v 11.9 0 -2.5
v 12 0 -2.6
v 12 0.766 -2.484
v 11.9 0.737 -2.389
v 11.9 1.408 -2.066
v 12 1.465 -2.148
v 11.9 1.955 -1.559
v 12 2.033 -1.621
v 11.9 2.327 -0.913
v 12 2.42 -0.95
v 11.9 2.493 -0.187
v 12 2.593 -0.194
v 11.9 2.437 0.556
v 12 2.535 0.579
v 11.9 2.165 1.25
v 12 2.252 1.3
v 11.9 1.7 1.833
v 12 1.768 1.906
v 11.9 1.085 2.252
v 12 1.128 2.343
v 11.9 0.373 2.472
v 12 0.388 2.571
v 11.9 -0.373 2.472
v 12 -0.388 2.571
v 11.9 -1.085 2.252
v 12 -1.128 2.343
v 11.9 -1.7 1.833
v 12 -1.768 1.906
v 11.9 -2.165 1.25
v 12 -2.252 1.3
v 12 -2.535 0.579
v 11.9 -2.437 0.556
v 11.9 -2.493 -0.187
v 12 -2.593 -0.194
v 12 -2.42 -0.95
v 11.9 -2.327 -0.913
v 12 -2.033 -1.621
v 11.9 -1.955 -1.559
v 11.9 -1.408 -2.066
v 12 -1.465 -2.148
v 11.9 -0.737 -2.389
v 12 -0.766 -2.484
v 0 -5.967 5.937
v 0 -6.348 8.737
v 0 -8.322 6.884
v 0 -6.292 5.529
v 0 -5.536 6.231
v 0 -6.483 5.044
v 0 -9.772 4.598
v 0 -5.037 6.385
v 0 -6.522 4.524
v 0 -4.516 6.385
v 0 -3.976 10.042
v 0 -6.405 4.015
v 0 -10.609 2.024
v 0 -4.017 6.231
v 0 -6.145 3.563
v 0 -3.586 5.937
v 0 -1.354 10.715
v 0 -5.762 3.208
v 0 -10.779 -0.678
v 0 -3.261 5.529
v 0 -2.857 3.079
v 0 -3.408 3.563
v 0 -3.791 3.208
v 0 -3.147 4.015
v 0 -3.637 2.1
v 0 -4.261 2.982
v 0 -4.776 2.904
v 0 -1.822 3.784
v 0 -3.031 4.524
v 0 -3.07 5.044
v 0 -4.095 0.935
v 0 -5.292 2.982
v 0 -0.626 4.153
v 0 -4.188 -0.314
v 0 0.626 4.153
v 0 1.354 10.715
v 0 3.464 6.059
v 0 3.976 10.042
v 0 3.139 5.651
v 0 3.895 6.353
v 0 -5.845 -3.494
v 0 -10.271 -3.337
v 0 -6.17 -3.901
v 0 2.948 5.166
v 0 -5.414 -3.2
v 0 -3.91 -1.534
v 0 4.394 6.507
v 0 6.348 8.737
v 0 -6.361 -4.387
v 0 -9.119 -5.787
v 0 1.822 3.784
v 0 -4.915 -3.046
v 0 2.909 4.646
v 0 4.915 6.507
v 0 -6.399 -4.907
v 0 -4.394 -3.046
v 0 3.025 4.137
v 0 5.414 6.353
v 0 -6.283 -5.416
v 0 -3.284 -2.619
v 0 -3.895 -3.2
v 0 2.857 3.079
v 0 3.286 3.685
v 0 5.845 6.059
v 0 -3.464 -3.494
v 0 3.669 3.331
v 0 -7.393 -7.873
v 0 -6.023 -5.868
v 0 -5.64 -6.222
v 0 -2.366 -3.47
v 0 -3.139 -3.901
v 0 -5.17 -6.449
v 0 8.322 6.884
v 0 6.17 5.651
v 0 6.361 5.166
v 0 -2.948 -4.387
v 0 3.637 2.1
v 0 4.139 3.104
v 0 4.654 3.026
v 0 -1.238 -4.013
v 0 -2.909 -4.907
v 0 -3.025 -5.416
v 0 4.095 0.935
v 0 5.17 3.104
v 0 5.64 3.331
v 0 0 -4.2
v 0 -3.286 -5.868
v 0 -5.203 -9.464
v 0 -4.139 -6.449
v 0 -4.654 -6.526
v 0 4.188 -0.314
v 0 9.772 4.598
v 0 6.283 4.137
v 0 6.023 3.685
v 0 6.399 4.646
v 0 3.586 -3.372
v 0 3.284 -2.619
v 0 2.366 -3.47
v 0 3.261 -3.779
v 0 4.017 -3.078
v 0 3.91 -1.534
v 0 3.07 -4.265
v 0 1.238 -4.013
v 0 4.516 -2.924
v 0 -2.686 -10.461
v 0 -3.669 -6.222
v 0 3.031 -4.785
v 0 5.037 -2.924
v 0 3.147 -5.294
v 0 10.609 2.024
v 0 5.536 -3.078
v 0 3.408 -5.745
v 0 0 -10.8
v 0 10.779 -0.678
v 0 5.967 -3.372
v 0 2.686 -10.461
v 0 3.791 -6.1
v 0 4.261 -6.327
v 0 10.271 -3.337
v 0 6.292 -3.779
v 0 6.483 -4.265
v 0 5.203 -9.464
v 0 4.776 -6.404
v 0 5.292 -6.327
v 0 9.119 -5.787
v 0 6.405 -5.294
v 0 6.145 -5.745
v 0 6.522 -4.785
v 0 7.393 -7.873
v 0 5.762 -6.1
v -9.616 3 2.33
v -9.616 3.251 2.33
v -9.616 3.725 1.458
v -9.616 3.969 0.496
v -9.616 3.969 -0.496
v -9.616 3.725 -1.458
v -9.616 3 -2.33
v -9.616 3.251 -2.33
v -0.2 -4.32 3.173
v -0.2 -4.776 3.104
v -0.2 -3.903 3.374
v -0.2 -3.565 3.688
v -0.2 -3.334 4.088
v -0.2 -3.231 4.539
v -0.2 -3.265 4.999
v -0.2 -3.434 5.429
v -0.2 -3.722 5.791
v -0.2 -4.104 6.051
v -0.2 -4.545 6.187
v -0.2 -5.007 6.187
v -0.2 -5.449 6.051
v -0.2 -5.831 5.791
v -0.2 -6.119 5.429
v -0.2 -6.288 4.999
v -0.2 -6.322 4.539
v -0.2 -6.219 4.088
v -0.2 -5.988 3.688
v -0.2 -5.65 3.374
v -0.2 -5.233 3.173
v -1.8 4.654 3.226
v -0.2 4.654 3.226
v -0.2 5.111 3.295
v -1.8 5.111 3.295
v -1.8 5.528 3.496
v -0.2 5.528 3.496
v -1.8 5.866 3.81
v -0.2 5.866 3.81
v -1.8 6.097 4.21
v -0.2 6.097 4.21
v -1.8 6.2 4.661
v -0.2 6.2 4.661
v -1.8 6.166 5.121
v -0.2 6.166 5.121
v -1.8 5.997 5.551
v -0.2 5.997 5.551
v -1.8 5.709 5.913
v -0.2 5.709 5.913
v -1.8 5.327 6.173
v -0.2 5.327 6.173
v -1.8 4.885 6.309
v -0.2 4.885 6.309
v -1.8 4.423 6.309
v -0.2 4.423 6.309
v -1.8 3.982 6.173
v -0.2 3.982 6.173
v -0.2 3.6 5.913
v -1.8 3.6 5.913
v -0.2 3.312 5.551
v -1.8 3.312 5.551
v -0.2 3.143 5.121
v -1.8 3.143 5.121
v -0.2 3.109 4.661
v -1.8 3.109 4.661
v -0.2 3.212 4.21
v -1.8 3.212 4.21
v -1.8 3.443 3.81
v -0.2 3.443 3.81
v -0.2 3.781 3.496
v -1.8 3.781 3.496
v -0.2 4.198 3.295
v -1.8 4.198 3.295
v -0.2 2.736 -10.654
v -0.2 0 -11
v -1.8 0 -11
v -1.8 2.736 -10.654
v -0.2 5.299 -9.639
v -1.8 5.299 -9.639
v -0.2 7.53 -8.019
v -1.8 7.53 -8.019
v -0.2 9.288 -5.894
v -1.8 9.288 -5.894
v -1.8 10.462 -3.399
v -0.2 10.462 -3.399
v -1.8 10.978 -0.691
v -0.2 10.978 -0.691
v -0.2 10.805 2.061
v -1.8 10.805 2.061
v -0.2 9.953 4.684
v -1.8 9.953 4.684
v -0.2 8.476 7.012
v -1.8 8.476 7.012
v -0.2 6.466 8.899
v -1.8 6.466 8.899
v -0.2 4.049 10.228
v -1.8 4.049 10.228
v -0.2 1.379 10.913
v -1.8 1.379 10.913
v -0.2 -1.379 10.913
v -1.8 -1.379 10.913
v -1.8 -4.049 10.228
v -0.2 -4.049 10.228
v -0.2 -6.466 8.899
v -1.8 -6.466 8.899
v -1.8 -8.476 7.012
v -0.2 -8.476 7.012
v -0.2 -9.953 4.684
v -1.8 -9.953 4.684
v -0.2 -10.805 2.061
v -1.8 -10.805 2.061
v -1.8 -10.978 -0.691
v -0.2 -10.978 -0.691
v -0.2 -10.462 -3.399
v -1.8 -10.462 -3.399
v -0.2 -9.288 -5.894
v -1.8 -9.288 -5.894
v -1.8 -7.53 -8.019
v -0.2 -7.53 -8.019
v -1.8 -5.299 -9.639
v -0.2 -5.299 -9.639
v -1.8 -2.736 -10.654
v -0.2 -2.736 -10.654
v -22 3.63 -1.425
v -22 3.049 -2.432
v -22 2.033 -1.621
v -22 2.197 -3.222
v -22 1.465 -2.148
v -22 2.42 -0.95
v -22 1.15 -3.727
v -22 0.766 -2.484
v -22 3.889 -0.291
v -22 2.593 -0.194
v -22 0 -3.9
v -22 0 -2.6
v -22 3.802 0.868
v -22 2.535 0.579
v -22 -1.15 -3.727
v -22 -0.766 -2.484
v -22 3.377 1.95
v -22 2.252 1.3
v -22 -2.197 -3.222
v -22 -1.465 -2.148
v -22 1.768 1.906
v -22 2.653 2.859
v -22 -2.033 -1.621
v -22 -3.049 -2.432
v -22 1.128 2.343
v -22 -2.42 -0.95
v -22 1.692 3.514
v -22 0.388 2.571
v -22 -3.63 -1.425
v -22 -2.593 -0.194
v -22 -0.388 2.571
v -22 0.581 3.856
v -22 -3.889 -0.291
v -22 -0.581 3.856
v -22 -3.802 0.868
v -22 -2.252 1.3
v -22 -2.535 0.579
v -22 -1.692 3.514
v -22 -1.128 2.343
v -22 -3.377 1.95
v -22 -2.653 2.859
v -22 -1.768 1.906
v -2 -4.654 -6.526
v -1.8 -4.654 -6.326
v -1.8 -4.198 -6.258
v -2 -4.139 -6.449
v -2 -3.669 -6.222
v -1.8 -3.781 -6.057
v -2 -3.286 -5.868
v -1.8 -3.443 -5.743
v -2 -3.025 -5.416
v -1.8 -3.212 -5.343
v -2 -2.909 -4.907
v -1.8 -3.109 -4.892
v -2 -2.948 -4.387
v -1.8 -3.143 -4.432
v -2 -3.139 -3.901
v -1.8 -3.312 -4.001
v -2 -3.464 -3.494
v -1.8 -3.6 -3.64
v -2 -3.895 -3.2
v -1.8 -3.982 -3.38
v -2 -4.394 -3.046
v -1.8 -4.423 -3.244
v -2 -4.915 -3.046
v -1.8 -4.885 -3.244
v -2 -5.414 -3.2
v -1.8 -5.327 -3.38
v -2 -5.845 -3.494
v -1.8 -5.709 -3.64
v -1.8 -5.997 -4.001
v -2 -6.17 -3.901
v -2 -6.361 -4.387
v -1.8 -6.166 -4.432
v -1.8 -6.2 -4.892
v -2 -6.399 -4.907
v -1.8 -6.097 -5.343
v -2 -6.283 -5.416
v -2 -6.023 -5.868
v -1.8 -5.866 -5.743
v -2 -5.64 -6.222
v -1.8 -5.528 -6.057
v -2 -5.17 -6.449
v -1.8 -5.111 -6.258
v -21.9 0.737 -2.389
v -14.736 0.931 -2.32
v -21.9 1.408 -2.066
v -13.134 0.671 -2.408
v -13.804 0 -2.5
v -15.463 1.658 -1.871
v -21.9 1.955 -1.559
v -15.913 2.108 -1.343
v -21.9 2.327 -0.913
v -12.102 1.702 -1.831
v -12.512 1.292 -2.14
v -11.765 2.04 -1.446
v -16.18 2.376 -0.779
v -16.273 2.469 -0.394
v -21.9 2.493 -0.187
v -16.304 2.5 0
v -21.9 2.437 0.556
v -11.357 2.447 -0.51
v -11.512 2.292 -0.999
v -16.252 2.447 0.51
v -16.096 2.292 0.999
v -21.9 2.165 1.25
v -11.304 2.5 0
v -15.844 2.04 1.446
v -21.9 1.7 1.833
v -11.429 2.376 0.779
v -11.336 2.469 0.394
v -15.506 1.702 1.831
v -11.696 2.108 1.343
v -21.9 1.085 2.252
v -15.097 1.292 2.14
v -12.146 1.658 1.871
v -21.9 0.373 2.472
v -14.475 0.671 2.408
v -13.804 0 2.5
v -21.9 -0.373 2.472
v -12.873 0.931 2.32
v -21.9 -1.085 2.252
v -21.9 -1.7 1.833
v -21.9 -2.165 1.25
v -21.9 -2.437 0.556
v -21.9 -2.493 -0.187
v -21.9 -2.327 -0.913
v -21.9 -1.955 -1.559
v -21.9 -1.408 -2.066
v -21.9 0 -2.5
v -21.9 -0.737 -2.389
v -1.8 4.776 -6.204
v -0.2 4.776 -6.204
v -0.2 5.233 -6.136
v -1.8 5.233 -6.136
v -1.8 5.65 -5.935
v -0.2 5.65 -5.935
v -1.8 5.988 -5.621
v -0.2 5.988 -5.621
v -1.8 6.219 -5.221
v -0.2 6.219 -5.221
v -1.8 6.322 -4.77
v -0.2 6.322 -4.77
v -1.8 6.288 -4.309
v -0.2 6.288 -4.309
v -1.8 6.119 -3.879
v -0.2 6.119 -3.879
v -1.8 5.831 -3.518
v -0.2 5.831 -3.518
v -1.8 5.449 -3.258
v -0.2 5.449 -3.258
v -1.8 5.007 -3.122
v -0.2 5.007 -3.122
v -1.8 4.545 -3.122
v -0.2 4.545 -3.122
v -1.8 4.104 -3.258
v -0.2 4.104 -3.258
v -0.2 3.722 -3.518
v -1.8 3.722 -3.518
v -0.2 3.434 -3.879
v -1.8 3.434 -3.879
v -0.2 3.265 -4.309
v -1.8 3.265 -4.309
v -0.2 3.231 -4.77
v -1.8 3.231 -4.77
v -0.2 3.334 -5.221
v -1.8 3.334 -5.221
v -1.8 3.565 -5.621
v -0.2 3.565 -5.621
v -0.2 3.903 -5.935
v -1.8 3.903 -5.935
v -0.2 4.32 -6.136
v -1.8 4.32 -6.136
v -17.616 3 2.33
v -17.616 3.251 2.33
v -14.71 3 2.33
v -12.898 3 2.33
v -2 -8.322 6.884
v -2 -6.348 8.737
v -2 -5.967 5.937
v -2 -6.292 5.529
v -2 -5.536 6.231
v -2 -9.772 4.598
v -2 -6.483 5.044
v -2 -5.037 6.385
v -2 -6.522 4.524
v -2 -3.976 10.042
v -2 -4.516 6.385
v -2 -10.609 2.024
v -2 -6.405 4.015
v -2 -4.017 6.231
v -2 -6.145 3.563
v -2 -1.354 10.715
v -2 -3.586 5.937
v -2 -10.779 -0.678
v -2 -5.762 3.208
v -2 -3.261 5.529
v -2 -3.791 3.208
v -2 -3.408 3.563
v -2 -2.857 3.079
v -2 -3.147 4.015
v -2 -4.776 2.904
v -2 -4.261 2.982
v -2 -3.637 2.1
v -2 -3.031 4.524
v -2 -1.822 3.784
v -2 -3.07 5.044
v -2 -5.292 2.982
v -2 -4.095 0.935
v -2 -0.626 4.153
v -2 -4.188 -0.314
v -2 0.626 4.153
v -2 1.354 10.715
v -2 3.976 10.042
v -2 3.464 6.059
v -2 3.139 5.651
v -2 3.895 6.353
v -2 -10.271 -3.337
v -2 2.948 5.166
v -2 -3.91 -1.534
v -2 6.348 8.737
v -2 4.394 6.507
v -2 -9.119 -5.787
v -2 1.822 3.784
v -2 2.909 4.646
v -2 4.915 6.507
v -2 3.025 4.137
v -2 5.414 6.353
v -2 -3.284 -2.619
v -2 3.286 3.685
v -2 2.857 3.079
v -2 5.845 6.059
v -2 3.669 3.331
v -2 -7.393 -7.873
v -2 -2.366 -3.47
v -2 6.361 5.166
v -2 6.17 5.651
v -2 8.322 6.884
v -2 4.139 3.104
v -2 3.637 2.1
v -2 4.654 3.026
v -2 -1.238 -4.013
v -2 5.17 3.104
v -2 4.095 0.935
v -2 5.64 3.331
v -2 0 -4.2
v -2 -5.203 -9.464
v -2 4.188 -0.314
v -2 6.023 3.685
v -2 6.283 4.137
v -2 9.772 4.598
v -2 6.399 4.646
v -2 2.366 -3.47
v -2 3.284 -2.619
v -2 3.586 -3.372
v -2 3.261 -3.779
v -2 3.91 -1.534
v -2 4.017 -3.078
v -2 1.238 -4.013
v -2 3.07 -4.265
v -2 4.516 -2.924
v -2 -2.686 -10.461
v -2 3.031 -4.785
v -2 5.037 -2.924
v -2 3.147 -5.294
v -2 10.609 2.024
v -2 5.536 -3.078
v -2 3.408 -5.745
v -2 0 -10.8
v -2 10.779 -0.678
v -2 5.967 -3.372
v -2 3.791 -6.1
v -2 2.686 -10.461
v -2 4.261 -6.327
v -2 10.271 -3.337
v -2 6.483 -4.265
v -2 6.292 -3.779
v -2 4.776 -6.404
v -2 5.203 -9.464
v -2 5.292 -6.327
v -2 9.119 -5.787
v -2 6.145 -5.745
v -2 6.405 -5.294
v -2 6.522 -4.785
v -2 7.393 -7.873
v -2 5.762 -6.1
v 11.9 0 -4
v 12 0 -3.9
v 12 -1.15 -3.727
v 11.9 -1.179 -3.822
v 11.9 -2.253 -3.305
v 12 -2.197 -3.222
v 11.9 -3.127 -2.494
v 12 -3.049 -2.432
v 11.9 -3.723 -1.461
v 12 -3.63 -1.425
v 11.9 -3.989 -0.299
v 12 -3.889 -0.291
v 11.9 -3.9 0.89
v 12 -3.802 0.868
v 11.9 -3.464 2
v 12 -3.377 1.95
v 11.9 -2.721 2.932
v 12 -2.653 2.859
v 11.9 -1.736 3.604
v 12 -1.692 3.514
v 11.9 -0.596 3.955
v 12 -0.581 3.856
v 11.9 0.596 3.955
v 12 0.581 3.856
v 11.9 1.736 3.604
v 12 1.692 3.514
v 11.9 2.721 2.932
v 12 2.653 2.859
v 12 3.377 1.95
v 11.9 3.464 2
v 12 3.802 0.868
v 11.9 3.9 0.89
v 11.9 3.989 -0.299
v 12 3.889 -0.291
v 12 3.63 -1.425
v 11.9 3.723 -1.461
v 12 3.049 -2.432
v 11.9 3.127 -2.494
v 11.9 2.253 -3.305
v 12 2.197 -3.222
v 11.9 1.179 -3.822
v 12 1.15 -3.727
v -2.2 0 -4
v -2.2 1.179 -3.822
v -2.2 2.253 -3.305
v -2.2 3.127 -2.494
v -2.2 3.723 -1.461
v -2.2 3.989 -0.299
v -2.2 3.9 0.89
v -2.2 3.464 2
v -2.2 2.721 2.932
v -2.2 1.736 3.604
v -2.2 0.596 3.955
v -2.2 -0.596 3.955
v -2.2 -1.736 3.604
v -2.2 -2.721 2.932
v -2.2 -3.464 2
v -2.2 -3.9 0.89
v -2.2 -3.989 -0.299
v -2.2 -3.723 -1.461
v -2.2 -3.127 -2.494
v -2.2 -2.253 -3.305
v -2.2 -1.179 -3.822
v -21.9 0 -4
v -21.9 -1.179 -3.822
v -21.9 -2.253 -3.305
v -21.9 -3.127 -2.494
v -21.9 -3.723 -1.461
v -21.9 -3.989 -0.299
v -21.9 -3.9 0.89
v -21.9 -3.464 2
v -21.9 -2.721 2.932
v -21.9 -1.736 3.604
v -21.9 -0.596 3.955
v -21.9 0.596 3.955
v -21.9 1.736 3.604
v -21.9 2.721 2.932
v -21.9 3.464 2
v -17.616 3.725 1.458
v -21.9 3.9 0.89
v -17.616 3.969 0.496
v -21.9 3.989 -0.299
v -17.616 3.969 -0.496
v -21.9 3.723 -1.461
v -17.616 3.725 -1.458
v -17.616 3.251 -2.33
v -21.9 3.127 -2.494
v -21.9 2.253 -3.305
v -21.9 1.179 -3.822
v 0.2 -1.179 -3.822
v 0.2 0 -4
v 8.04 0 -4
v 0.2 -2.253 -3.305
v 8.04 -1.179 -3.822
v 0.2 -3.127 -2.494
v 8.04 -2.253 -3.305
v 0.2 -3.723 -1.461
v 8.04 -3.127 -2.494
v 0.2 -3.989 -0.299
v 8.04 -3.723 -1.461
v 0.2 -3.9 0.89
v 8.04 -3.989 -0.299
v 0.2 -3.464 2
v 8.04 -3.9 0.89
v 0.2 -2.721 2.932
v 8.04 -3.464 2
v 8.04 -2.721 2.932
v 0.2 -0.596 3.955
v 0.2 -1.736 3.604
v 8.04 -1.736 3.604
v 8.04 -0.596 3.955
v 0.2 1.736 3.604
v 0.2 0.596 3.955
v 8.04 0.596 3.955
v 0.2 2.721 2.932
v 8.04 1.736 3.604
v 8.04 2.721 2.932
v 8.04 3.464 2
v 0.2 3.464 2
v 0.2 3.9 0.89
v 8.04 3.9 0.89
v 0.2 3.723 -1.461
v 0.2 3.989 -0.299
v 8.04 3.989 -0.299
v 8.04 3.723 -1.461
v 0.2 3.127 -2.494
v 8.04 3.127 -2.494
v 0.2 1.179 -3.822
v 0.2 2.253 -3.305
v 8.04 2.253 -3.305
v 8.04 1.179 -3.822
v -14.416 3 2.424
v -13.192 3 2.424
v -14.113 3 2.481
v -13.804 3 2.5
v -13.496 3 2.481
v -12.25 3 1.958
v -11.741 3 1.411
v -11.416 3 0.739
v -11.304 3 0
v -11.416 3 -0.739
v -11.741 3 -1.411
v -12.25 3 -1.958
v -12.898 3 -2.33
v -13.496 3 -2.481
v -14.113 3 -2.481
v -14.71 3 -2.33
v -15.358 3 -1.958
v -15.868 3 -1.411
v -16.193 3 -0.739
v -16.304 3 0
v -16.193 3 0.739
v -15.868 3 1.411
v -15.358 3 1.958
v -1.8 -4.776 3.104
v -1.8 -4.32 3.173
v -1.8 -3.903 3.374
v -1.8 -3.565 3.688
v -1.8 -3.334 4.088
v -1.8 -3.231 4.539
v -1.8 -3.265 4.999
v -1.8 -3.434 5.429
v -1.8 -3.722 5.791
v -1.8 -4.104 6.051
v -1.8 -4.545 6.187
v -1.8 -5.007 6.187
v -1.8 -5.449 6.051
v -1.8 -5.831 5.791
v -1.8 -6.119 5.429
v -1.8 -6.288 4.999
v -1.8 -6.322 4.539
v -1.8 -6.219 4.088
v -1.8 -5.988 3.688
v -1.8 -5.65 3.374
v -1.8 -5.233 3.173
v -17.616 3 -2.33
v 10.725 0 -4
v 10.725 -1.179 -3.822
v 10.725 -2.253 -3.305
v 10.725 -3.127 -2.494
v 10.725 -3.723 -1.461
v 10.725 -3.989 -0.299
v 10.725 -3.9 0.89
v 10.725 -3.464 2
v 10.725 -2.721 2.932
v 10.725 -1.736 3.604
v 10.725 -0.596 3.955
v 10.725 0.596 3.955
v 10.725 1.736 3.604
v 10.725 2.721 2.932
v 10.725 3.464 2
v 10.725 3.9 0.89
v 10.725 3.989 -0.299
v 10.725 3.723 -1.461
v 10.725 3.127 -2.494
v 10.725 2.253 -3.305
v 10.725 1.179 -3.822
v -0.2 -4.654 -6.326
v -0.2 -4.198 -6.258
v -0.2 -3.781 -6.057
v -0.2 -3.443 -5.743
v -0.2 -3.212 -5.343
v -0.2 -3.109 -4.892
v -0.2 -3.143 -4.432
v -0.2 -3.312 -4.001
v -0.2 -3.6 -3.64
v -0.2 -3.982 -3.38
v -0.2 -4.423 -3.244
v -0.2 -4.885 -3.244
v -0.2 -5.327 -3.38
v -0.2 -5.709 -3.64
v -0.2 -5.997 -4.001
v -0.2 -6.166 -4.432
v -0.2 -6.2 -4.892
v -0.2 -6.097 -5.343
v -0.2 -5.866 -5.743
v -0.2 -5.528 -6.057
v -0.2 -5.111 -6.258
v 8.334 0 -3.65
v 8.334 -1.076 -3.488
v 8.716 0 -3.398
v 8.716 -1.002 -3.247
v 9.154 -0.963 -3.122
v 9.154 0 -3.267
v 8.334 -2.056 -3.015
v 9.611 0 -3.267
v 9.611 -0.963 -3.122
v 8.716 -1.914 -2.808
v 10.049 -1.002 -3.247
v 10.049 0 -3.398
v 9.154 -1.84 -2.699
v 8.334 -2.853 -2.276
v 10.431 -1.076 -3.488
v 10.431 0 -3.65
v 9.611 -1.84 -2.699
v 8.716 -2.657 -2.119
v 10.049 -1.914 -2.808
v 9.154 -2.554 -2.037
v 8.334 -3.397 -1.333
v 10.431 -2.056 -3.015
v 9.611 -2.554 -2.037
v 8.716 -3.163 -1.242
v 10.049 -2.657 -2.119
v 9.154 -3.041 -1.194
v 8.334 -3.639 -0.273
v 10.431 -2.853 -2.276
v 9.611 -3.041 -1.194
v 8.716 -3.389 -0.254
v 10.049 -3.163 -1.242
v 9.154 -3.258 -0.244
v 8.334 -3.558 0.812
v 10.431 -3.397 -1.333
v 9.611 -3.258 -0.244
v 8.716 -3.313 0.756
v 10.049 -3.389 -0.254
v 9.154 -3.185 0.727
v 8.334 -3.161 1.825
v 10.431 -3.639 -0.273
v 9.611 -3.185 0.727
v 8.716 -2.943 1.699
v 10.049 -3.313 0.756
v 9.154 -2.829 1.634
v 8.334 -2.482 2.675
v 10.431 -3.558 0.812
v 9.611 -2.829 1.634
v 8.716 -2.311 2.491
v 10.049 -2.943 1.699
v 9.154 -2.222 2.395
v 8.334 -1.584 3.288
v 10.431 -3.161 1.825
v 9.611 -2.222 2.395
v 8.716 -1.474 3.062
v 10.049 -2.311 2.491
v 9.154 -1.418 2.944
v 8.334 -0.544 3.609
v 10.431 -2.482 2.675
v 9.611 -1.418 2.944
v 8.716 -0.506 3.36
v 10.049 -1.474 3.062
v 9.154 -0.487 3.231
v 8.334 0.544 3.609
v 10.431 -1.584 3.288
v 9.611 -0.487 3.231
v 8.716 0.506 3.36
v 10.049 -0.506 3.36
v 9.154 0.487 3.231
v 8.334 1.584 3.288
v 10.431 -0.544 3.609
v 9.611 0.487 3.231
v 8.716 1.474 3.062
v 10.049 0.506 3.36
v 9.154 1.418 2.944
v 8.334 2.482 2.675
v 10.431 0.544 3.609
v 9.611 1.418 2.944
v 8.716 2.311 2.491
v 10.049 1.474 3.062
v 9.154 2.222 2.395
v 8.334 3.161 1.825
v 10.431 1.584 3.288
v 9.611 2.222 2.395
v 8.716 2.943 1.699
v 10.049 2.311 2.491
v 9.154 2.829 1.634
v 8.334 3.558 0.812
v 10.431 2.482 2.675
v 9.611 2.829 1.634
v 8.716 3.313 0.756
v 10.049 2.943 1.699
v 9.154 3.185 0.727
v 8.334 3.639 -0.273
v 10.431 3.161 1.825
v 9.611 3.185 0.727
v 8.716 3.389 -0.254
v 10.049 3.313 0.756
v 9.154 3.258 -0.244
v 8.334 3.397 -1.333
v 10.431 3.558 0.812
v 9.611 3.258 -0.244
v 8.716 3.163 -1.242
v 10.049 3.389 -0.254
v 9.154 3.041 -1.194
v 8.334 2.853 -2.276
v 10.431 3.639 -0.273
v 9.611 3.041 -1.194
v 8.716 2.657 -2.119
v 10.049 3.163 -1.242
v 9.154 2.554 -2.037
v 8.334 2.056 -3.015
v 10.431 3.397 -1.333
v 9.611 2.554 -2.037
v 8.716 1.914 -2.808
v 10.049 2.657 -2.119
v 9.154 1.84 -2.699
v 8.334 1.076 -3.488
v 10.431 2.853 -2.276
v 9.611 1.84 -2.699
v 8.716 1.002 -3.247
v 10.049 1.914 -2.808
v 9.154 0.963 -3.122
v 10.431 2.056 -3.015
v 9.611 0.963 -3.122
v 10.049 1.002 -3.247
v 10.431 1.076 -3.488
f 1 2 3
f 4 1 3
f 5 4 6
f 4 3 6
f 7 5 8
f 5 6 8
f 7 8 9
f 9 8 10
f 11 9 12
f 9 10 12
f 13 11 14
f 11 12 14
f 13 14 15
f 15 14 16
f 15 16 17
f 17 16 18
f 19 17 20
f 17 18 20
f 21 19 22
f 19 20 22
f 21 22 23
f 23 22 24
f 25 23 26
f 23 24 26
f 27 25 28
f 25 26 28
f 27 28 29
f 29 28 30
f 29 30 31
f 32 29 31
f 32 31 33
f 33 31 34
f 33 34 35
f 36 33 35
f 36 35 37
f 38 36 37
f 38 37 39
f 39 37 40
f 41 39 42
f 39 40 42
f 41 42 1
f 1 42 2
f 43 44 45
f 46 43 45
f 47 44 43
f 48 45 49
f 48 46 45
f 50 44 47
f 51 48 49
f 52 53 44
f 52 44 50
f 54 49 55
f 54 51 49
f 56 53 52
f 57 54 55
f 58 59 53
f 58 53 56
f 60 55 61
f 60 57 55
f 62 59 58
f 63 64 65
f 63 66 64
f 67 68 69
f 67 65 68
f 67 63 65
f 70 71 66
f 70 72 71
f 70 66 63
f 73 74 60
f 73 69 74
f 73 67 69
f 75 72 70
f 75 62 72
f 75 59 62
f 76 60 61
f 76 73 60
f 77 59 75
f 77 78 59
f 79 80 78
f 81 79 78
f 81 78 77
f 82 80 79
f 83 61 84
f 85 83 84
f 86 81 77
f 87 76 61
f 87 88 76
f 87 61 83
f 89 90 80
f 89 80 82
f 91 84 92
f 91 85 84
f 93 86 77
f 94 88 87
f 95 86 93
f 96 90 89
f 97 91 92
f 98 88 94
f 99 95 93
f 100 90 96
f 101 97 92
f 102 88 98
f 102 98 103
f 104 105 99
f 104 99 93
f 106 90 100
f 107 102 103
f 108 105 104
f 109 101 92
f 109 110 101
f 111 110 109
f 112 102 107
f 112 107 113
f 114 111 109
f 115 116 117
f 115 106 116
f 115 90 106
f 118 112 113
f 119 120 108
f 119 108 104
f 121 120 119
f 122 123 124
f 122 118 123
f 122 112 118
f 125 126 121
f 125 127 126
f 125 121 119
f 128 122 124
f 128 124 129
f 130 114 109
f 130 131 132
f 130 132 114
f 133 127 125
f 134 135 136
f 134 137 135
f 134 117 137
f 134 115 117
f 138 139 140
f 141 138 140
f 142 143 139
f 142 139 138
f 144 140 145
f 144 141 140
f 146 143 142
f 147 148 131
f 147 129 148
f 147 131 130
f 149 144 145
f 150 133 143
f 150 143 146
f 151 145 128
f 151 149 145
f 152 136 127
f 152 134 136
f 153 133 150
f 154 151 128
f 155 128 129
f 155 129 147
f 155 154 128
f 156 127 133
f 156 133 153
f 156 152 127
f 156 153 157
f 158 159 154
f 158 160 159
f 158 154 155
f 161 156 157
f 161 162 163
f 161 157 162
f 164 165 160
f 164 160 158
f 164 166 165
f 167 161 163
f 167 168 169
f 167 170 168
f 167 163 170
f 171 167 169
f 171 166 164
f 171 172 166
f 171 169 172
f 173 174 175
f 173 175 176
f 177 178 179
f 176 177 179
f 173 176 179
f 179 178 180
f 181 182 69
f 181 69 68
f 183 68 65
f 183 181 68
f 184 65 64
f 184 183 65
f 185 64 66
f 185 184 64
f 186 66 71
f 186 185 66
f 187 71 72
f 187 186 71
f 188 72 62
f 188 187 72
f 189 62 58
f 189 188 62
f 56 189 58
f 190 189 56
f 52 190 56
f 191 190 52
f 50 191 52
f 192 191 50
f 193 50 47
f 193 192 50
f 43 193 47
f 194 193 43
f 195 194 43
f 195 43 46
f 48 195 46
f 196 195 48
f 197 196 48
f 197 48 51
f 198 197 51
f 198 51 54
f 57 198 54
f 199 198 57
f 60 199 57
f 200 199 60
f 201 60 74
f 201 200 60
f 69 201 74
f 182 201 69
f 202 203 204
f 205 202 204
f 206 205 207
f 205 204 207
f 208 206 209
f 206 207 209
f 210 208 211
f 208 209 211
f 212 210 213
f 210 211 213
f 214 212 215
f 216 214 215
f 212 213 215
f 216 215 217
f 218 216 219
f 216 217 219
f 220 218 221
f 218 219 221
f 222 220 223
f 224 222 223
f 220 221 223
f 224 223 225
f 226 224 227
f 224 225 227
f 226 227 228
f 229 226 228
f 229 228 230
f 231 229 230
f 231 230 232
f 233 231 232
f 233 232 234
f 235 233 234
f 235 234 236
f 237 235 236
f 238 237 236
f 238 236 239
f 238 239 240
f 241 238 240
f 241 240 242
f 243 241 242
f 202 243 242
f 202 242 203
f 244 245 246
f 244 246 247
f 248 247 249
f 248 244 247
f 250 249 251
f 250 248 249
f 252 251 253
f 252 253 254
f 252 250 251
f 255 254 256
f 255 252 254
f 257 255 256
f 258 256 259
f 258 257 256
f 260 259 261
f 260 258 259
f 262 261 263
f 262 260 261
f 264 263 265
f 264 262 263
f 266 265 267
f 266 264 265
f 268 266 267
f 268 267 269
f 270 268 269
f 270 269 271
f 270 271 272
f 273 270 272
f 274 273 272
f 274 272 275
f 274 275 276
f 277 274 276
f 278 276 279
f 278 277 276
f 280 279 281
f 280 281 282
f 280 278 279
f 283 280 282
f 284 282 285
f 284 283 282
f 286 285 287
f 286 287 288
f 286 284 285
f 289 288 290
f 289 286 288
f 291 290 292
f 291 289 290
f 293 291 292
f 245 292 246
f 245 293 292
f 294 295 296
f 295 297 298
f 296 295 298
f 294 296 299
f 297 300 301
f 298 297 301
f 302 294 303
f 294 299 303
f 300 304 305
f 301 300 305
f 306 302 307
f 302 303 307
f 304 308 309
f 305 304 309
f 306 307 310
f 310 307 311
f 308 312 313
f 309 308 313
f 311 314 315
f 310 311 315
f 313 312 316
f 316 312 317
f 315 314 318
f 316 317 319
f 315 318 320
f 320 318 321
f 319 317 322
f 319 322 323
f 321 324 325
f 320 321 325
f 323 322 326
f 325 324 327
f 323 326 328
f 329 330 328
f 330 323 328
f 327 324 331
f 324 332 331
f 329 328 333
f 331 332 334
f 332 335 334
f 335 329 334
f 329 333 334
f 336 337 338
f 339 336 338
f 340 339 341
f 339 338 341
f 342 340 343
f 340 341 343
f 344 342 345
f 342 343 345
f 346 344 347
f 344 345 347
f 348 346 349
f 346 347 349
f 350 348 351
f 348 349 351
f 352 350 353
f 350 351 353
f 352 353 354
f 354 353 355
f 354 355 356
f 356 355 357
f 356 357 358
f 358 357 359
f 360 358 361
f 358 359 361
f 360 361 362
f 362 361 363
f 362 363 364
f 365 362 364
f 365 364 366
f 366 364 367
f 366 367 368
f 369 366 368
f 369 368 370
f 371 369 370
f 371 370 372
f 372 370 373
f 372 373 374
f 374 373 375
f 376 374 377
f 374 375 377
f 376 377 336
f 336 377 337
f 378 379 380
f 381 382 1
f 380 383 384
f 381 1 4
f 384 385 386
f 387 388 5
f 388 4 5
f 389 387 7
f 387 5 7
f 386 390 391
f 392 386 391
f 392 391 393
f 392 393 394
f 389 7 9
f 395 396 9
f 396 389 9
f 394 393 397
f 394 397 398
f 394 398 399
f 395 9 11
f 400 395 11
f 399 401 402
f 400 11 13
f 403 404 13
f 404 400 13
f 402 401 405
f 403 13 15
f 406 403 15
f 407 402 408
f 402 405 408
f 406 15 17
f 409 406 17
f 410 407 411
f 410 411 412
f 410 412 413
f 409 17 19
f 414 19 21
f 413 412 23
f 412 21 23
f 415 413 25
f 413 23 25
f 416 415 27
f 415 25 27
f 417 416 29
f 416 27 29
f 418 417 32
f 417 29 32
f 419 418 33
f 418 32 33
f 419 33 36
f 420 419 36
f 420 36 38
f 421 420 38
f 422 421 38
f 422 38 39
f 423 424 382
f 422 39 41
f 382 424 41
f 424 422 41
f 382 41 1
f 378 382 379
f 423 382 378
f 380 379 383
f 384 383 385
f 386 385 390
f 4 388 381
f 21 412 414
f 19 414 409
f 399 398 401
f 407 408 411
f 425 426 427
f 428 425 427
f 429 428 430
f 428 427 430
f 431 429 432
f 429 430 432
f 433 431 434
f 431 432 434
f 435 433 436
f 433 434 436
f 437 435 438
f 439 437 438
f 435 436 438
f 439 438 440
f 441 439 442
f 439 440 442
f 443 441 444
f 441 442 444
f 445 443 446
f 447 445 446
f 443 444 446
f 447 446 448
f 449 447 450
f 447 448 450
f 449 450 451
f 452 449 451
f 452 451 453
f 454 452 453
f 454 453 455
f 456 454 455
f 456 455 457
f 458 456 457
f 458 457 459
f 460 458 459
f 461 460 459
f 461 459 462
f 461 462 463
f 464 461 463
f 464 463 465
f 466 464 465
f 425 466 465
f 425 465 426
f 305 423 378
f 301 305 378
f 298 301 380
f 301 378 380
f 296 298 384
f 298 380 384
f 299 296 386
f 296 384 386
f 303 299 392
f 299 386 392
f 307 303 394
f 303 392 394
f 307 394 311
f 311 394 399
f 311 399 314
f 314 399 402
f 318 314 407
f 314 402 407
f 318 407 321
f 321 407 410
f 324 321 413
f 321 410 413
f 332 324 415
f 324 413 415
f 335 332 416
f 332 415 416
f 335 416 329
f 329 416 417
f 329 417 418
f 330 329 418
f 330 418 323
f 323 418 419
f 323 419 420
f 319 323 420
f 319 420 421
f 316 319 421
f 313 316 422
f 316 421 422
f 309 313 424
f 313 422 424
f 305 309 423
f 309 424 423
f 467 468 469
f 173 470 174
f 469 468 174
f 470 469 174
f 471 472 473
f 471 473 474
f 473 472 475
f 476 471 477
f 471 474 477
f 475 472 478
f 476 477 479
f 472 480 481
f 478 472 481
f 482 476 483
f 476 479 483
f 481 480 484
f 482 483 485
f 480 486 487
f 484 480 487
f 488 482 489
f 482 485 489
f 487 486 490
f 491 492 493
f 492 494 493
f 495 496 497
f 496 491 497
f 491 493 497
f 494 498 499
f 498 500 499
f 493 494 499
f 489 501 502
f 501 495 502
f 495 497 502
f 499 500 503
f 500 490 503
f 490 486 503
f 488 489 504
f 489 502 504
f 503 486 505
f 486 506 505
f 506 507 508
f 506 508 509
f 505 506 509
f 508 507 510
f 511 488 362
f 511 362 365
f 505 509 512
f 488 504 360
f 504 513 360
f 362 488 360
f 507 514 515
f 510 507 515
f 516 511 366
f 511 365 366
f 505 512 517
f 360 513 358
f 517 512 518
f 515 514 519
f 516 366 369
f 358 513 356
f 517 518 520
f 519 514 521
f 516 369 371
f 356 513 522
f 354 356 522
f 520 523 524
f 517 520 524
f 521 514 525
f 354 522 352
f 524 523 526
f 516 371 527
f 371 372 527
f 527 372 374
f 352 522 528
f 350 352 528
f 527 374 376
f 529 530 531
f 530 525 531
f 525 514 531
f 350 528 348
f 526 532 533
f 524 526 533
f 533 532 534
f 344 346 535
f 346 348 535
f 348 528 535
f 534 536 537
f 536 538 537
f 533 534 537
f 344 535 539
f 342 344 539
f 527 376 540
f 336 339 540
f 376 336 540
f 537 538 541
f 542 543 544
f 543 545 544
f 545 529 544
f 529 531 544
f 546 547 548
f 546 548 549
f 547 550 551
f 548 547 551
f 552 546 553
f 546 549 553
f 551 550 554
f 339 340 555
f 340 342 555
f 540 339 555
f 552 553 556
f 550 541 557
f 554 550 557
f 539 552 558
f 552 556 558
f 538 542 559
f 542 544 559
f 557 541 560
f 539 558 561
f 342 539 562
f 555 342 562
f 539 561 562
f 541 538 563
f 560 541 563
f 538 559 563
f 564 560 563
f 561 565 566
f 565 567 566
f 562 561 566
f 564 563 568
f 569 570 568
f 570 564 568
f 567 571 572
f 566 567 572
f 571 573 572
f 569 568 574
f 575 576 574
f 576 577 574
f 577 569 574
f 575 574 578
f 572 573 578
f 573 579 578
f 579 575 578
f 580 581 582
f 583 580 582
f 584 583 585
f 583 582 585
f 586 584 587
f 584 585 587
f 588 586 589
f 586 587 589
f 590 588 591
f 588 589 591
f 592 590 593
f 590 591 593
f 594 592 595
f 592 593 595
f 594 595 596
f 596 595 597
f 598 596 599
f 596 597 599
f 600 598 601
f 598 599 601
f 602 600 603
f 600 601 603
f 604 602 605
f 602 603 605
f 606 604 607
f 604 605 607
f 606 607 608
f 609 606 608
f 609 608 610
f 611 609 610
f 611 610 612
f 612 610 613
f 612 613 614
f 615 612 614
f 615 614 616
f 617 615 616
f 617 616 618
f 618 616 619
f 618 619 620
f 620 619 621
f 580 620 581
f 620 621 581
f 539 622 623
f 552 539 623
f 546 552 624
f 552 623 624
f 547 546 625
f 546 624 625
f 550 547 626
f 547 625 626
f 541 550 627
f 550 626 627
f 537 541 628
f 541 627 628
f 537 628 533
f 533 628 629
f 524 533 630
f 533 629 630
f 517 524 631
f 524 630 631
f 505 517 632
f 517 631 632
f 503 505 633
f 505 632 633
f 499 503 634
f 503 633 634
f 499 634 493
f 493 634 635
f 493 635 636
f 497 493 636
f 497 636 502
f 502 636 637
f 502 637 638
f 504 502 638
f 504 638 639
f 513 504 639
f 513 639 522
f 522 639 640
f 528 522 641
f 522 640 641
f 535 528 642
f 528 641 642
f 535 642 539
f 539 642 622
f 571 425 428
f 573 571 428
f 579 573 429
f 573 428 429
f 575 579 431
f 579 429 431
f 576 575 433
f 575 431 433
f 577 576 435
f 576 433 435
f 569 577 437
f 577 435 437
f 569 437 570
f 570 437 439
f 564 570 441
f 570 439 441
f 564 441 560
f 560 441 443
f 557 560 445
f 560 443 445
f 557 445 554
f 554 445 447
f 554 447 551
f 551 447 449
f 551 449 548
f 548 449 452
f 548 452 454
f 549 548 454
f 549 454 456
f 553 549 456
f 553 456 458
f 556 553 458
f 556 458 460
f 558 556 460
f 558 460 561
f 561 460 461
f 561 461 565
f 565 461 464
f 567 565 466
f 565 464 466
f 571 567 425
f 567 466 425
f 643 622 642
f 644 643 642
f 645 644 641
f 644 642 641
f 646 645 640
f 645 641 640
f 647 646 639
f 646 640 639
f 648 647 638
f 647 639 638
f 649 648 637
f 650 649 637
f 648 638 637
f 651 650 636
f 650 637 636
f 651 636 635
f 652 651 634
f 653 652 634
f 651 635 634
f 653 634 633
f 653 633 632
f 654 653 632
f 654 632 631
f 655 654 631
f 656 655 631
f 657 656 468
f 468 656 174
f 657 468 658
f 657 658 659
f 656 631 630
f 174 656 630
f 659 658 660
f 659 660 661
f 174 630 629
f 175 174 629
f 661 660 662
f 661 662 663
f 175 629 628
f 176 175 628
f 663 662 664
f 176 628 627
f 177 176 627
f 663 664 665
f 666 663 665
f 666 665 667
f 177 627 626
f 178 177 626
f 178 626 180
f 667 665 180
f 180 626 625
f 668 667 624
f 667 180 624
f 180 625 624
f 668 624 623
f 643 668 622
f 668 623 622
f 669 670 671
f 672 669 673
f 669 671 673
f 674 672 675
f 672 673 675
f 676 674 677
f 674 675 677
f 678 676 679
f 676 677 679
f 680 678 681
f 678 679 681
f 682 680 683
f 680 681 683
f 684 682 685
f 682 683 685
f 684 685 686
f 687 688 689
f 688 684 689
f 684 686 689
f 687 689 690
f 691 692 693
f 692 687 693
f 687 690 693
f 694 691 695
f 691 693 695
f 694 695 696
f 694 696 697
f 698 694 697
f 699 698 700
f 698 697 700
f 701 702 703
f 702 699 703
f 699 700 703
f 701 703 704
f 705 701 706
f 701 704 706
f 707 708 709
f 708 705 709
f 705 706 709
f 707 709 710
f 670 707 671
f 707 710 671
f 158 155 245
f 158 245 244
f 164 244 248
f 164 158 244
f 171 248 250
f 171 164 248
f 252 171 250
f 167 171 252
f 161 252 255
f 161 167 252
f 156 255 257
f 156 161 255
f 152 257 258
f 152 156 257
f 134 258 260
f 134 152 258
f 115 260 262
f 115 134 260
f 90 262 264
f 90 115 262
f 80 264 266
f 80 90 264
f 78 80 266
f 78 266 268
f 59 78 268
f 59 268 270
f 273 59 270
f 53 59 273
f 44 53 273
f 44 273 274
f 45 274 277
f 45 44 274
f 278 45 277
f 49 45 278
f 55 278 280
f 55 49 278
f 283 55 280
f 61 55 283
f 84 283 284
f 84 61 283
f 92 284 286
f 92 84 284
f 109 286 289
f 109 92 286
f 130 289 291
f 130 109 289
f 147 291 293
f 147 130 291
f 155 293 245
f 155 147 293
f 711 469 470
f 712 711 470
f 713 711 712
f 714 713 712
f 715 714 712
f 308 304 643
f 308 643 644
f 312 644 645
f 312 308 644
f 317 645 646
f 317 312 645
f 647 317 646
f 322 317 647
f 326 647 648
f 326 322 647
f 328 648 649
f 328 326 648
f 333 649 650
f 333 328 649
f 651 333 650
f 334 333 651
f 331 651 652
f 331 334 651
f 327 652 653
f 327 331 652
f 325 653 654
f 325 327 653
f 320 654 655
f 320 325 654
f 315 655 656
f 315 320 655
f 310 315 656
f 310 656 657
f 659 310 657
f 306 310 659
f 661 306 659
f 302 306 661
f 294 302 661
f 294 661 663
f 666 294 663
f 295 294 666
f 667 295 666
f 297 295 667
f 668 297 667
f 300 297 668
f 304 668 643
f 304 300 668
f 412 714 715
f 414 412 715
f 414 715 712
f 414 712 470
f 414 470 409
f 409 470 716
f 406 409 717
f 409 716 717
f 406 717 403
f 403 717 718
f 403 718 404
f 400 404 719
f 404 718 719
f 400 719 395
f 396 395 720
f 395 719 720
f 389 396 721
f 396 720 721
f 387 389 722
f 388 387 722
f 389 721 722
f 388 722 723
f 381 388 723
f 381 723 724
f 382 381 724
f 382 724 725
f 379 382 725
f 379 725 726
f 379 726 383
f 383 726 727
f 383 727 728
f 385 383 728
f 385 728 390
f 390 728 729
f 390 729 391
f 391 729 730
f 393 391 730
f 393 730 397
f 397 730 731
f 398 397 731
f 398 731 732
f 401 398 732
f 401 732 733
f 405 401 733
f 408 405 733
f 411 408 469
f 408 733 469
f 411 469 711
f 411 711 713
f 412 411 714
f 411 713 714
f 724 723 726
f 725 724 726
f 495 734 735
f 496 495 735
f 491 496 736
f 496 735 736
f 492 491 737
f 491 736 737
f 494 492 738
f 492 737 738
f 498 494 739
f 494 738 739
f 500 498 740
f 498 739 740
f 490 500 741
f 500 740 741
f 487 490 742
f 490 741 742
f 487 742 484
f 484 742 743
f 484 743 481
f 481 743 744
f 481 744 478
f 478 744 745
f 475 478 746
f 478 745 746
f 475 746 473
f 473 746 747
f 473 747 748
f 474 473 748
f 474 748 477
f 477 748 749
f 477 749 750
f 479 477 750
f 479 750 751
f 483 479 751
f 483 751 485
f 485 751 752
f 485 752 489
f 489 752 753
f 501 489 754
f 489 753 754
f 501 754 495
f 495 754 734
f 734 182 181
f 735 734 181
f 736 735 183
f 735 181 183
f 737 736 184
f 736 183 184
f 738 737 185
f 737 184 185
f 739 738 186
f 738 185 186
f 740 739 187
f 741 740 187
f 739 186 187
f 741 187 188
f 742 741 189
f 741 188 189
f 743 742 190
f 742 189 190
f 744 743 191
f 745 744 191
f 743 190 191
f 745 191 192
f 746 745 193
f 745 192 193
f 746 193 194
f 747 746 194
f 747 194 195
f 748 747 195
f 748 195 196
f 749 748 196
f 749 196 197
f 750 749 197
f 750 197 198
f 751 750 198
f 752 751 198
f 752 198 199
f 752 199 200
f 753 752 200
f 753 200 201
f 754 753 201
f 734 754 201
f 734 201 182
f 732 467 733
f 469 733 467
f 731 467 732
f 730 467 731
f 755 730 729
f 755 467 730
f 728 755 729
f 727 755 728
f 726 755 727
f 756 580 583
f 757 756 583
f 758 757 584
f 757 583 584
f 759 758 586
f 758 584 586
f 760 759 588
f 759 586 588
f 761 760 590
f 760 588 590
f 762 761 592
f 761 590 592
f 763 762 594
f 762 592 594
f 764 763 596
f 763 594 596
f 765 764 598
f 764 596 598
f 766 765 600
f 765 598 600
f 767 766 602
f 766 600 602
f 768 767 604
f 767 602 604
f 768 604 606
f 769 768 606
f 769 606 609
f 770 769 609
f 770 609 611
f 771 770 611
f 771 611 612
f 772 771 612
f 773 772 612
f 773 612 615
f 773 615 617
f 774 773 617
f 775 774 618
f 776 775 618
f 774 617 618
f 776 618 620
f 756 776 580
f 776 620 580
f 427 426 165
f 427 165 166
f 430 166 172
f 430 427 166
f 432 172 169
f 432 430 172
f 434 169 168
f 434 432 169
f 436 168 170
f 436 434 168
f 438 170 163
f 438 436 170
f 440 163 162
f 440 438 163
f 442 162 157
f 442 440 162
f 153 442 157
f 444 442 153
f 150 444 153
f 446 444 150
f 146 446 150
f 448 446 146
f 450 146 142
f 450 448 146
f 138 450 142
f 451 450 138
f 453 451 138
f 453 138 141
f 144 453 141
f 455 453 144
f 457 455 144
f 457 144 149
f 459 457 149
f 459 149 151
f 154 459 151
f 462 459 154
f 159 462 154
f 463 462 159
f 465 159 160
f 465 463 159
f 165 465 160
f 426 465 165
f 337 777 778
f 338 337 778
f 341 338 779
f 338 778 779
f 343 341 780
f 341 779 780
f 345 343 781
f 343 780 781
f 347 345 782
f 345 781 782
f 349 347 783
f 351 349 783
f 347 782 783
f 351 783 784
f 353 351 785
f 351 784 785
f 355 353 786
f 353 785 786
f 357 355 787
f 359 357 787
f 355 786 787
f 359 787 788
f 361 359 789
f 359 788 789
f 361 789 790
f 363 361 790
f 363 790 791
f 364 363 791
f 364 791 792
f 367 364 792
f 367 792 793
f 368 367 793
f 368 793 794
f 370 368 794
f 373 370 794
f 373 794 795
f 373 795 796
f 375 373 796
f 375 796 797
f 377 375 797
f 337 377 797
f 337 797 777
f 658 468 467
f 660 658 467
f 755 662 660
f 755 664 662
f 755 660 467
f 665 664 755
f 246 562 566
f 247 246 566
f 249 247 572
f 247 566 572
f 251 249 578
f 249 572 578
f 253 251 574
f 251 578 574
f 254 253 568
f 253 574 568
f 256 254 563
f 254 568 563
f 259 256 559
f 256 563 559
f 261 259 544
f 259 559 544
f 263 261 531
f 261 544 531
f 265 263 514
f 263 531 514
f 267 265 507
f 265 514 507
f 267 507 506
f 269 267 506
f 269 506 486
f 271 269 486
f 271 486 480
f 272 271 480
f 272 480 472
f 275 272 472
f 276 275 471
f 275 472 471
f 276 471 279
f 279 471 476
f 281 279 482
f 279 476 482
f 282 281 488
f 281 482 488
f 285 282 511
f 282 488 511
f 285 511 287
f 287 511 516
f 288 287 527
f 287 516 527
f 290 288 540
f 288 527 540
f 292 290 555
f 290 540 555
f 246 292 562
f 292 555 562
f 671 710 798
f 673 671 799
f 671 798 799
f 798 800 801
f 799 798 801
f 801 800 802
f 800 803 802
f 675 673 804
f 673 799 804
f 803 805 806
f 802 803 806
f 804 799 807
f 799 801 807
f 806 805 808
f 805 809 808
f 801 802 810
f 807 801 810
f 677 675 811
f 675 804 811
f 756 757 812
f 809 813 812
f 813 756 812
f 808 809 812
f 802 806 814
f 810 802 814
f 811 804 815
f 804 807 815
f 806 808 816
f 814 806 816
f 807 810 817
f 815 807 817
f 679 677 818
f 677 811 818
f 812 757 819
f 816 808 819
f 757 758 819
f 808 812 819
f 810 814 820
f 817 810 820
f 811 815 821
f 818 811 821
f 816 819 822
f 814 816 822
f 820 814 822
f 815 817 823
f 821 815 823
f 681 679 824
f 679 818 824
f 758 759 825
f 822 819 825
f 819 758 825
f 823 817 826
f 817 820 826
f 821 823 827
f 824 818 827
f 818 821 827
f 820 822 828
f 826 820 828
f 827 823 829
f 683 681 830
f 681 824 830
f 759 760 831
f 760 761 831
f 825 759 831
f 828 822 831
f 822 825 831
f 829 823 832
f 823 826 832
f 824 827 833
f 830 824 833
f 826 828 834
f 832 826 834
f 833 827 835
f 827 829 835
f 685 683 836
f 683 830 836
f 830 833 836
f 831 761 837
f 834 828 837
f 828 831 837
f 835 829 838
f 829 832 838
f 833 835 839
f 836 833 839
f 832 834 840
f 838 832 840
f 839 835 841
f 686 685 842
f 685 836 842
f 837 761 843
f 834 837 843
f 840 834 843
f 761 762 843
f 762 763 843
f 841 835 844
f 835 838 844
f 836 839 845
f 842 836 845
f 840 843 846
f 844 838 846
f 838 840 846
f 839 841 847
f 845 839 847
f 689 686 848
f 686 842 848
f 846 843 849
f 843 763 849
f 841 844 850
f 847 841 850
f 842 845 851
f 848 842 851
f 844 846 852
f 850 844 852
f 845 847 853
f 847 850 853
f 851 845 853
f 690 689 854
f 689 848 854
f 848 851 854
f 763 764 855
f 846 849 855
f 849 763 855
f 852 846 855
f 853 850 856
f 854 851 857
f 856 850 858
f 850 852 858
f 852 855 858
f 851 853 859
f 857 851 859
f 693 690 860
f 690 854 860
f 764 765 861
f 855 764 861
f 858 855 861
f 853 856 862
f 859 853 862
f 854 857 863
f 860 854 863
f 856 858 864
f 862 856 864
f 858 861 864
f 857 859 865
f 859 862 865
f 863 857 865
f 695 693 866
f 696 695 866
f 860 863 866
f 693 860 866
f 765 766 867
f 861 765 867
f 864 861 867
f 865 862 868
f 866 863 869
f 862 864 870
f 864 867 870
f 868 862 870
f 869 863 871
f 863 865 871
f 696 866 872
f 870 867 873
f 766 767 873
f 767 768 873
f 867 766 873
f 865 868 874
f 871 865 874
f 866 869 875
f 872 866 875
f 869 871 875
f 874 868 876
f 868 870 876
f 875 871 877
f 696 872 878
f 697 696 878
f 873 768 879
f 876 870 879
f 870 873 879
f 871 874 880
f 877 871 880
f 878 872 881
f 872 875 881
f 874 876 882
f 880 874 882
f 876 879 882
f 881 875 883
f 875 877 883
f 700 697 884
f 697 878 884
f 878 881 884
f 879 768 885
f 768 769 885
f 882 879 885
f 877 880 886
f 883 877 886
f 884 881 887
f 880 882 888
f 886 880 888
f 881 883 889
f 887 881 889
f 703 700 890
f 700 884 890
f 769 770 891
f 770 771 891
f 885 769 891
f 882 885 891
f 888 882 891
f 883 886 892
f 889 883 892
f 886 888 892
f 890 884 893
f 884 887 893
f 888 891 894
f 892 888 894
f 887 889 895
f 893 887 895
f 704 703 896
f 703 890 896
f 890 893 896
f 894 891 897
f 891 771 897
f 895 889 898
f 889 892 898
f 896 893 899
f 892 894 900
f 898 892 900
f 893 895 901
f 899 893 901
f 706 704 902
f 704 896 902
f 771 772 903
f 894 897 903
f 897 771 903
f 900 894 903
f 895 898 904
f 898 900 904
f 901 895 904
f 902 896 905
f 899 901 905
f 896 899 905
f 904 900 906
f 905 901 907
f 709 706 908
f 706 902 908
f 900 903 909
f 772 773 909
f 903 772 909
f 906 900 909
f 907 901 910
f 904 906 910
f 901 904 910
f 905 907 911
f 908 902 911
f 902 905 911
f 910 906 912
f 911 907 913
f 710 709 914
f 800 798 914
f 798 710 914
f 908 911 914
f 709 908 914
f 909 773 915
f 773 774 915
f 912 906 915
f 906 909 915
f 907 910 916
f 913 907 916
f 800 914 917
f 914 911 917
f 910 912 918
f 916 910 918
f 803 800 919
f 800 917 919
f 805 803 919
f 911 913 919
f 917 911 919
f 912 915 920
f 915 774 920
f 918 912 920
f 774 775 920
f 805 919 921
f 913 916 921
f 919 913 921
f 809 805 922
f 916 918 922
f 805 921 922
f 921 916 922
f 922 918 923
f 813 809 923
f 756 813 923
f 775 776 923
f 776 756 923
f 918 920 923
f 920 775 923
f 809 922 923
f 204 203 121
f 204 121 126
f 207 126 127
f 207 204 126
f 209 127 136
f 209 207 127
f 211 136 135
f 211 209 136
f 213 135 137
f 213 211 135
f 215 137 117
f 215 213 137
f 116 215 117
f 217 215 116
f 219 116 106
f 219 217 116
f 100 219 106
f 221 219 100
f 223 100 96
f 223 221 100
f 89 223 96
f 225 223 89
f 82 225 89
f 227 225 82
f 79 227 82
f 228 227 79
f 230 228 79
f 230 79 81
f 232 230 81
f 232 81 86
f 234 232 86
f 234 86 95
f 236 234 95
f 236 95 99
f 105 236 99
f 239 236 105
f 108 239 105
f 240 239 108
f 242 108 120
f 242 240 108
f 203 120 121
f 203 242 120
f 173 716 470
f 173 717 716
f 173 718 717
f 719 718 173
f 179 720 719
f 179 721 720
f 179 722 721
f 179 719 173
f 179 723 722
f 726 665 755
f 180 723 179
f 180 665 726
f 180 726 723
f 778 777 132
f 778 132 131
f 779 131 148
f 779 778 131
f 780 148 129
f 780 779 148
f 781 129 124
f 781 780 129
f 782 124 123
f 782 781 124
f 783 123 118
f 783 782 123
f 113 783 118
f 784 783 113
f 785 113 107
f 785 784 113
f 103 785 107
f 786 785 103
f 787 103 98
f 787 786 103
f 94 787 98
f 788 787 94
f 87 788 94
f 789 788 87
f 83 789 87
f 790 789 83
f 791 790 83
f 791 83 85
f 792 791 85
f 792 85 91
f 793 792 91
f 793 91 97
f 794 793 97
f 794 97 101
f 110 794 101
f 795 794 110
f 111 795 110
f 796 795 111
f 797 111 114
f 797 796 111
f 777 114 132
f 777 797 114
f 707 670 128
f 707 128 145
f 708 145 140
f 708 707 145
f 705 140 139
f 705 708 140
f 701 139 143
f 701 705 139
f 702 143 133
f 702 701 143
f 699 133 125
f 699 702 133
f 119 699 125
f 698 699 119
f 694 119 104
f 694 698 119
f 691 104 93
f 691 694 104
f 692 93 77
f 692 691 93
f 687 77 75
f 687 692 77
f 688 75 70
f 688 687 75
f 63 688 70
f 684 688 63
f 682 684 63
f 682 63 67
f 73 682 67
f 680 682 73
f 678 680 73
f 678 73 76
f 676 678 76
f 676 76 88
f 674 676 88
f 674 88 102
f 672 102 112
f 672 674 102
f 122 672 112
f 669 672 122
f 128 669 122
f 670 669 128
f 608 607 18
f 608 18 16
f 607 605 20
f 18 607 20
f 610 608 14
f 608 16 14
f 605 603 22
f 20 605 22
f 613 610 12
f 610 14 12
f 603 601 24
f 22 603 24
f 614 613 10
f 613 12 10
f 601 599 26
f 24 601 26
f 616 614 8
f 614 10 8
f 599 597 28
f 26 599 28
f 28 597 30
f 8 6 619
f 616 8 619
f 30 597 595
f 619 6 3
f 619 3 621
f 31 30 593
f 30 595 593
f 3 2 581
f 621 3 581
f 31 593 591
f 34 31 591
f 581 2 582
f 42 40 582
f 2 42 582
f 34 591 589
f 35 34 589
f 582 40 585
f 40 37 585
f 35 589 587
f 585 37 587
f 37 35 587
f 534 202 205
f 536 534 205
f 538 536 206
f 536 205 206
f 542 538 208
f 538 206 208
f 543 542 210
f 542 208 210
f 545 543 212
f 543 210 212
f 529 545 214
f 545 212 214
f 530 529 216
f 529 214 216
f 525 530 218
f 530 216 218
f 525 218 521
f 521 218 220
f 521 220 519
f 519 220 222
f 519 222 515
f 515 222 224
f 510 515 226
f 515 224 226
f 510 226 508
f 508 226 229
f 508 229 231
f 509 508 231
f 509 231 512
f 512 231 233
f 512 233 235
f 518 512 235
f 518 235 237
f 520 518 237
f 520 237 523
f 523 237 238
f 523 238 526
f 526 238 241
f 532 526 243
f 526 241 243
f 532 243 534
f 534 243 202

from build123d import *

# Parameters (mm, degrees)
SKETCH2_R               = 11
BOSS_EXTRUDE1_DEPTH     = 2
SKETCH3_R               = 2.5
CUT_EXTRUDE1_DEPTH      = 38.389838192
SKETCH4_W               = 8
SKETCH4_H               = 4.66
CUT_EXTRUDE2_DEPTH      = 1
CUT_EXTRUDE3_REACH      = 30.302
CUT_EXTRUDE3_END_RADIUS = 2.5
SKETCH5_R               = 2.5
SKETCH6_R               = 1.55
CUT_EXTRUDE4_DEPTH      = 27.944387171
CHAMFER1_SIZE           = 0.2
CHAMFER2_SIZE           = 0.1


with BuildPart() as part:
    # Sketch1 → Revolve1 (revolve)
    with BuildSketch(Plane(origin=(0, 0, 0), x_dir=(1, 0, 0), z_dir=(0, 1, 0))):
        with BuildLine():
            Line((-22, 4), (8.040136982, 4))
            ThreePointArc((8.040136982, 4), (9.382757902, 3.250506535), (10.725378822, 4))
            Line((10.725378822, 4), (12, 4))
            Line((12, 4), (12, 0))
            Line((12, 0), (-22, 0))
            Line((-22, 0), (-22, 4))
        make_face()
    revolve(axis=Axis((12, 0, 0), (-1, 0, 0)))

    # Sketch2 → Boss-Extrude1 (add)
    with BuildSketch(Plane(origin=(0, 0, 0), x_dir=(0, 0, -1), z_dir=(1, 0, 0))):
        Circle(SKETCH2_R)
    extrude(amount=-BOSS_EXTRUDE1_DEPTH)

    # Sketch3 → Cut-Extrude1 (cut, through all)
    with BuildSketch(Plane(origin=(12, 0, 0), x_dir=(0, 0, -1), z_dir=(1, 0, 0))):
        Circle(SKETCH3_R)
    extrude(amount=-CUT_EXTRUDE1_DEPTH, mode=Mode.SUBTRACT)

    # Sketch4 → Cut-Extrude2 (cut)
    with BuildSketch(Plane(origin=(0, 4, 0), x_dir=(1, 0, 0), z_dir=(0, 1, 0))):
        with Locations((-13.616018874, 0)):
            Rectangle(SKETCH4_W, SKETCH4_H)
    extrude(amount=-CUT_EXTRUDE2_DEPTH, mode=Mode.SUBTRACT)

    # Cut-Extrude3: up to this cylinder (the profile starts outside it)
    cut_extrude3_end = Plane(origin=(-13.804261, 0, 0), z_dir=(1, 0, 0)) * Cylinder(CUT_EXTRUDE3_END_RADIUS, 66.604, mode=Mode.PRIVATE)
    # Sketch5 → Cut-Extrude3 (cut, up to the surface)
    with BuildSketch(Plane(origin=(0, 3, 0), x_dir=(1, 0, 0), z_dir=(0, 1, 0)), mode=Mode.PRIVATE) as cut_extrude3_sk1:
        with Locations(Location((-13.804261439, 0, 0), (0, 0, 270))):
            Circle(SKETCH5_R)
    cut_extrude3_tool1 = extrude(cut_extrude3_sk1.sketch, amount=-CUT_EXTRUDE3_REACH, mode=Mode.PRIVATE) - cut_extrude3_end
    add(cut_extrude3_tool1.solids().sort_by_distance((-13.804261, 3, 0))[0], mode=Mode.SUBTRACT)

    # Sketch6 → Cut-Extrude4 (cut, through all)
    with BuildSketch(Plane(origin=(0, 0, 0), x_dir=(0, 0, -1), z_dir=(1, 0, 0))):
        with Locations((-4.776443449, 4.654384475)):
            Circle(SKETCH6_R)
        with Locations((4.654384475, 4.776443449)):
            Circle(SKETCH6_R)
        with Locations((4.776443449, -4.654384475)):
            Circle(SKETCH6_R)
        with Locations((-4.654384475, -4.776443449)):
            Circle(SKETCH6_R)
    extrude(amount=-CUT_EXTRUDE4_DEPTH, mode=Mode.SUBTRACT)

    # Chamfer1
    chamfer1_edges = [part.edges().sort_by_distance(p)[0] for p in [
        (0, 0, 4),
        (-2, 0, 4),
        (-2, 0, 11),
        (0, 0, 11),
        (-2, -4.776443449, 6.204384475),
        (0, -4.776443449, 6.204384475),
        (-2, -4.654384475, -3.226443449),
        (0, -4.654384475, -3.226443449),
        (-2, 4.776443449, -3.104384475),
        (0, 4.776443449, -3.104384475),
        (-2, 4.654384475, 6.326443449),
        (0, 4.654384475, 6.326443449),
    ]]
    chamfer(chamfer1_edges, length=CHAMFER1_SIZE)

    # Chamfer2
    chamfer2_edges = [part.edges().sort_by_distance(p)[0] for p in [
        (-22, 0, 2.5),
        (12, 0, 2.5),
        (-22, 0, 4),
        (12, 0, 4),
    ]]
    chamfer(chamfer2_edges, length=CHAMFER2_SIZE)


solid = part.part
